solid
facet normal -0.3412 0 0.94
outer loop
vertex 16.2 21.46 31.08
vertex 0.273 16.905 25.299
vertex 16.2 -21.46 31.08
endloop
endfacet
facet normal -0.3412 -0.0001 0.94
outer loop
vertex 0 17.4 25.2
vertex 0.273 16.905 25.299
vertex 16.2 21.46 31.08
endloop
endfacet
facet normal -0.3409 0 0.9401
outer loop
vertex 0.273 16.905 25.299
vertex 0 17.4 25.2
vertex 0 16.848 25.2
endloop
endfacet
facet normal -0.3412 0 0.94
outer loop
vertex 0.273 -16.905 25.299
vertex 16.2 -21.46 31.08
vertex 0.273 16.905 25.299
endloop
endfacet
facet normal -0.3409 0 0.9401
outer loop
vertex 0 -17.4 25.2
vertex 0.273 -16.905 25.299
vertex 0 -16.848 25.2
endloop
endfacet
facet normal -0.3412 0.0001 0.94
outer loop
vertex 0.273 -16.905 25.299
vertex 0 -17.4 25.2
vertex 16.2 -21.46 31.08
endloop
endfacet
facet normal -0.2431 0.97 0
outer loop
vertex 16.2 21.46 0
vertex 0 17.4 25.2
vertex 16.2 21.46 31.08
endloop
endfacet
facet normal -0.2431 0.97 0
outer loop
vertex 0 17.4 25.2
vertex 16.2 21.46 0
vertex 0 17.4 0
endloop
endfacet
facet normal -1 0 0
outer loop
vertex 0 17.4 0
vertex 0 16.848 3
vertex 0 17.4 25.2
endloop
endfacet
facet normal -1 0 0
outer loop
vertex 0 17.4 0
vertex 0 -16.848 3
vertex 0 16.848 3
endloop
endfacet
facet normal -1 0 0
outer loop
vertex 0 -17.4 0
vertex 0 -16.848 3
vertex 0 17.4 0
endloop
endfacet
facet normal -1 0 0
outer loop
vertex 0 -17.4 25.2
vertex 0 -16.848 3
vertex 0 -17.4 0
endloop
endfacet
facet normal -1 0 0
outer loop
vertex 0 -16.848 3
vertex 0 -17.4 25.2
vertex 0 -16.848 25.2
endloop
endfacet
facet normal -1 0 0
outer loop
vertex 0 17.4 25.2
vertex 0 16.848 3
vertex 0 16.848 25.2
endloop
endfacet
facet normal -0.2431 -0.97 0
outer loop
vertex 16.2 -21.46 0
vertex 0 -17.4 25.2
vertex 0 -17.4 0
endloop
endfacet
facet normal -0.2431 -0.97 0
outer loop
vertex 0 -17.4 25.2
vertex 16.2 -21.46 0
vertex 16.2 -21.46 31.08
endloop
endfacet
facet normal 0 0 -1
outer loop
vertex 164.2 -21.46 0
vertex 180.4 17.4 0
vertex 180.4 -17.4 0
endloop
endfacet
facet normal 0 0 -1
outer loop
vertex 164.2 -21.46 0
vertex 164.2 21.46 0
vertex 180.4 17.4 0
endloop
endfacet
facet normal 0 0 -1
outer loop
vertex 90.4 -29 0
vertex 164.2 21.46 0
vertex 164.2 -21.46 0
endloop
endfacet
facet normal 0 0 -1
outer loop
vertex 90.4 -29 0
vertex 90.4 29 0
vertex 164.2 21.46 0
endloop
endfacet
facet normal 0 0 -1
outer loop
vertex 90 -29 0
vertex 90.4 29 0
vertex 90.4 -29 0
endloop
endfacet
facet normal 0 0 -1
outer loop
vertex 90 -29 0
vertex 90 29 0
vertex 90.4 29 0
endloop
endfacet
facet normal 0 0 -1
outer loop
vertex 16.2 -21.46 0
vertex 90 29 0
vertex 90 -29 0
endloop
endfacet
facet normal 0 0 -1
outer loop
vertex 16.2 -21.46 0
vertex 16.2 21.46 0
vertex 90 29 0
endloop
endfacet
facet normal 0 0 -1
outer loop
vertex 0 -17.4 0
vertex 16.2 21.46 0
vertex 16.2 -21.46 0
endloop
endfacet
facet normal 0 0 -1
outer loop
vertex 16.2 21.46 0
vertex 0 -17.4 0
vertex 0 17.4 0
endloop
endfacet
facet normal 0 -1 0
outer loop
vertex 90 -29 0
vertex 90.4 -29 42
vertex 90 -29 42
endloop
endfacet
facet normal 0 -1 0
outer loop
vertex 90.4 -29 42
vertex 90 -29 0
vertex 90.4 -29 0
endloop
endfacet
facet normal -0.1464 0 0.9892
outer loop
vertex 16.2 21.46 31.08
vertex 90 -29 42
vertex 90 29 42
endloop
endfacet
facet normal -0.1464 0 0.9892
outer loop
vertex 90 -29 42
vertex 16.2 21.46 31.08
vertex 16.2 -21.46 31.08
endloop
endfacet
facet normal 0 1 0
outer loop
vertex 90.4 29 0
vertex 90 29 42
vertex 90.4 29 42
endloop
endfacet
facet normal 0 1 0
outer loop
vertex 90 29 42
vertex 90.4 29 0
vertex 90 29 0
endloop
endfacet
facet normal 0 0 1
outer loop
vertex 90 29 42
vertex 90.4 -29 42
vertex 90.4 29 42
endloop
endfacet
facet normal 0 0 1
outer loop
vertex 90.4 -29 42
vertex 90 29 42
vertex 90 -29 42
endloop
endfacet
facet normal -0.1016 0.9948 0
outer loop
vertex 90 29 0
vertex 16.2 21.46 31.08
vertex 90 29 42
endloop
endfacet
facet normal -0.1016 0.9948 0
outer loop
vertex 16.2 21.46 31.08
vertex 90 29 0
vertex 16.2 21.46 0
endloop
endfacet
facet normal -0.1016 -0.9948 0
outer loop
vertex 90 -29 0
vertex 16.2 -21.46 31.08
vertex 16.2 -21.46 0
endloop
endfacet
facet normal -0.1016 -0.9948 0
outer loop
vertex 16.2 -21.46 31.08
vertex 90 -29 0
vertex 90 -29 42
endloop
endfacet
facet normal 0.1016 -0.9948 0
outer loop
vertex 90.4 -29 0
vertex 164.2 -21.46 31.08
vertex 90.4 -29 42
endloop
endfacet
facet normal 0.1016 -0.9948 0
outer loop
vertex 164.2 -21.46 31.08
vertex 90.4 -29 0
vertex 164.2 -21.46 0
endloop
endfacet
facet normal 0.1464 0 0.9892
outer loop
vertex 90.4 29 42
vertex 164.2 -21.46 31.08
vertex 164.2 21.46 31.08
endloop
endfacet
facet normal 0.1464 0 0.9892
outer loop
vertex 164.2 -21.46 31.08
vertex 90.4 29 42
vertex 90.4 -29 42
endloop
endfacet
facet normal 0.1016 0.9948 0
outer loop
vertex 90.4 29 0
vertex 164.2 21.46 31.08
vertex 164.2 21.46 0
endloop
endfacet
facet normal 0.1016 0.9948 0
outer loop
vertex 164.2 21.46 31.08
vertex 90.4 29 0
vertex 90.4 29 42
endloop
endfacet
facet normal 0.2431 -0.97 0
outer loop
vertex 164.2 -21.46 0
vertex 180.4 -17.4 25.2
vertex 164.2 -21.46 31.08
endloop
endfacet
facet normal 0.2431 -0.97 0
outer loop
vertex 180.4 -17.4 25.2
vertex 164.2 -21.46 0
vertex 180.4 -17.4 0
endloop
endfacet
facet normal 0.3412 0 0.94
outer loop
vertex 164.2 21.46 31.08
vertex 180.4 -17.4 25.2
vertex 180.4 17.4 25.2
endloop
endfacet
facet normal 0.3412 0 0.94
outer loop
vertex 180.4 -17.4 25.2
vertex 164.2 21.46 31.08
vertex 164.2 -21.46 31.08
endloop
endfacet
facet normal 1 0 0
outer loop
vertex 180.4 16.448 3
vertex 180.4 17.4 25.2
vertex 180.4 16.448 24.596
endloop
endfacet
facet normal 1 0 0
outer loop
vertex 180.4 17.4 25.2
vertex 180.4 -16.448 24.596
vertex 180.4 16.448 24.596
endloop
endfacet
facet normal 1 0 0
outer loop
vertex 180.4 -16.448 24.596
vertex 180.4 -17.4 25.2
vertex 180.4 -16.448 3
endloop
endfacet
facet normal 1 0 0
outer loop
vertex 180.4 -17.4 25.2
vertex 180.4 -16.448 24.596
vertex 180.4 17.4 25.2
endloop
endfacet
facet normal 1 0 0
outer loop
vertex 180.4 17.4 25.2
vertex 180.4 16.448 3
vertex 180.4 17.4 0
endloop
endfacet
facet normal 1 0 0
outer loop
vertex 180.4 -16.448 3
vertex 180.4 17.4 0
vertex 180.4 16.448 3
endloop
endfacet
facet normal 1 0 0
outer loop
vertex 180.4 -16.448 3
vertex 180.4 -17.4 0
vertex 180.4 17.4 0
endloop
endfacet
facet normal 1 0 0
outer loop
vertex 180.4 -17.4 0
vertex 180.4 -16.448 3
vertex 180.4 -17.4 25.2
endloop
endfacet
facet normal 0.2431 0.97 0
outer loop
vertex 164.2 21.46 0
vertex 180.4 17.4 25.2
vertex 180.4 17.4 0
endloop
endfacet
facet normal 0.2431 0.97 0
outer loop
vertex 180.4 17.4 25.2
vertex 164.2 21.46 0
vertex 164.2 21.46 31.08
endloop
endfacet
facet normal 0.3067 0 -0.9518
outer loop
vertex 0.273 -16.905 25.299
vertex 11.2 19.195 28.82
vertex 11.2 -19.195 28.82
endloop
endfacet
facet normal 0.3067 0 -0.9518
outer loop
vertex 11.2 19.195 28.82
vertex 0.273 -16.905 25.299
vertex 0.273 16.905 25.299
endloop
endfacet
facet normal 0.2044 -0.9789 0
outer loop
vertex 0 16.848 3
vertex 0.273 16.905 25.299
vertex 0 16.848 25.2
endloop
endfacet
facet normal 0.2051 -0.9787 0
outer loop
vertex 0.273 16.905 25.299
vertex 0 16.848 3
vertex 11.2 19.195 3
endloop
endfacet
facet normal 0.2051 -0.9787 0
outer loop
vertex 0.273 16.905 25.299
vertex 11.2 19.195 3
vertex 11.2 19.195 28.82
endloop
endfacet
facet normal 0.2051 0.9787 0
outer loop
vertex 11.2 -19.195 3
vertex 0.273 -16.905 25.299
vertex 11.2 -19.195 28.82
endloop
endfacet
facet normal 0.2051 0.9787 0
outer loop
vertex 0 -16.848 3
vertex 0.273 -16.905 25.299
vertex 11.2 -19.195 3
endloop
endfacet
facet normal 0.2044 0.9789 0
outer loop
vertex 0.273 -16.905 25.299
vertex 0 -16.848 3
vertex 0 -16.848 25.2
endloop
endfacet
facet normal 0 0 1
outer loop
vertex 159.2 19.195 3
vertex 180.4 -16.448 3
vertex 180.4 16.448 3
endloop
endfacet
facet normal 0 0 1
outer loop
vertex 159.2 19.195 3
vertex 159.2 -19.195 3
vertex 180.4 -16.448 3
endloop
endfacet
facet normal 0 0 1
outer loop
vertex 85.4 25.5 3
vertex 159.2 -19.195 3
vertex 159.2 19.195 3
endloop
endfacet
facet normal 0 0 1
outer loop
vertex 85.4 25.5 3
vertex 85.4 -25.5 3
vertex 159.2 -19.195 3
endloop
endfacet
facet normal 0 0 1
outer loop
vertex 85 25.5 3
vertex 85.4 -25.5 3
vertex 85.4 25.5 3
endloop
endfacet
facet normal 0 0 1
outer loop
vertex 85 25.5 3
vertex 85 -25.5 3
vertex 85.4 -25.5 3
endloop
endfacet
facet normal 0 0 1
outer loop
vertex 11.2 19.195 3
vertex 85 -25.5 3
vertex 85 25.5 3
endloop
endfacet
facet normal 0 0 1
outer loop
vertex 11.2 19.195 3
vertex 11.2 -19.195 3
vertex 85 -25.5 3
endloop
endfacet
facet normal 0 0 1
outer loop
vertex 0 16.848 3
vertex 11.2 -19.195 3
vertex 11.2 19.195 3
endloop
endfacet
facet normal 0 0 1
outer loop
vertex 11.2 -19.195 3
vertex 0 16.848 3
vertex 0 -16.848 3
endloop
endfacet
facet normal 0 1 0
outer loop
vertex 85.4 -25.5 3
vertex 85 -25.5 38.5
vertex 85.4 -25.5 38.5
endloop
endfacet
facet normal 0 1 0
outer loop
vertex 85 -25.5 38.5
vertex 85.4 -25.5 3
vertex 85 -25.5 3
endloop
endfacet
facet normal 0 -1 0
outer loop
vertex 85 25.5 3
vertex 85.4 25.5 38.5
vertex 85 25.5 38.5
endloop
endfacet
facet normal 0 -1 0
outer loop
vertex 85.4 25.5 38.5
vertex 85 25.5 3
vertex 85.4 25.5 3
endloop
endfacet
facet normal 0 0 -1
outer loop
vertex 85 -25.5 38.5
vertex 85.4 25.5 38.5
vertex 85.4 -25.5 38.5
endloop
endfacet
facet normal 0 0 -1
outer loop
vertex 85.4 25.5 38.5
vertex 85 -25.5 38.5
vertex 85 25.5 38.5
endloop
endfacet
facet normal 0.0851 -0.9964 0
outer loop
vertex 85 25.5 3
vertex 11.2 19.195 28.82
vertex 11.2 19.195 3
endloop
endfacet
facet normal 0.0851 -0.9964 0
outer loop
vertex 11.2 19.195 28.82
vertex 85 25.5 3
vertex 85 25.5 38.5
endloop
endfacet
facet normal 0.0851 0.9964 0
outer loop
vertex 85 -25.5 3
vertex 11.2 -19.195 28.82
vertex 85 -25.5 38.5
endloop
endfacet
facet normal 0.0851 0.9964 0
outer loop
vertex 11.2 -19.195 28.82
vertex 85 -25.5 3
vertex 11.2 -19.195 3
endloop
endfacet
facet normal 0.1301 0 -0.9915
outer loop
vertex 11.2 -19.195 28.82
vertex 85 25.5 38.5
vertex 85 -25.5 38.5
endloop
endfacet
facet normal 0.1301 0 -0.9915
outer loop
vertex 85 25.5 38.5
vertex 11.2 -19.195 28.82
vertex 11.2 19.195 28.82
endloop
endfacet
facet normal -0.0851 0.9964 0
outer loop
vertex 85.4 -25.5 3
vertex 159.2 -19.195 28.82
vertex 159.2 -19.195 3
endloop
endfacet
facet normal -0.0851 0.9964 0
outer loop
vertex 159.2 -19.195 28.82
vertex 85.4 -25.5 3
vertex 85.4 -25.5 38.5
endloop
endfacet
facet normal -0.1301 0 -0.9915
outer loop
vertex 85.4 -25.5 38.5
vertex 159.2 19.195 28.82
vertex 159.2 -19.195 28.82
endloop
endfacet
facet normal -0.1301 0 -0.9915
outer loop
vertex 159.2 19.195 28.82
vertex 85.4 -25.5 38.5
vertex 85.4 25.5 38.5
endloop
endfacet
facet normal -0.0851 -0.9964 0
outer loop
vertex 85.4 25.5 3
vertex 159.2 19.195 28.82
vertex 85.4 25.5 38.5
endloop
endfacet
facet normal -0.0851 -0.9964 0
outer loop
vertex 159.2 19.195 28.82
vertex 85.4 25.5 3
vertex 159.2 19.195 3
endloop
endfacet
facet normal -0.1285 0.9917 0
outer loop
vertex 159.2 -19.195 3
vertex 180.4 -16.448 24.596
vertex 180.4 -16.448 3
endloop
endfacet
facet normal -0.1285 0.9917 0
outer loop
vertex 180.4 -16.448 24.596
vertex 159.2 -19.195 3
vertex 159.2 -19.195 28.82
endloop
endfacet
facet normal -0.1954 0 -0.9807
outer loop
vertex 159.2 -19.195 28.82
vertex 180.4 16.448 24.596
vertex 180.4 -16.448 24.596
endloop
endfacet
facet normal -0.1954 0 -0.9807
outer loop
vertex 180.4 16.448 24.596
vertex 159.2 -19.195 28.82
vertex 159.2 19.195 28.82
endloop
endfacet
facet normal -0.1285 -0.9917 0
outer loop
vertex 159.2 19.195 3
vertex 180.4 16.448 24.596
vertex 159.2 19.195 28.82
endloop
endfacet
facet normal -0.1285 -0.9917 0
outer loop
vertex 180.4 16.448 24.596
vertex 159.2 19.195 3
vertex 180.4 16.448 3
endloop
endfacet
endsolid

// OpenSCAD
$fn = 32;

// ----------------------------------------------------------------------
// Faired channel: 180 x 58 x 42 mm, 3.5 mm walls, faired ends
// ----------------------------------------------------------------------

// --- parameters (mm) ---
length = 180;             // channel length
width = 58;               // channel width at mid length
height = 42;              // channel height at mid length
wall = 3.5;               // side wall thickness
floor_t = 3;              // floor thickness
end_w = 34.8;             // faired end width
end_h = 25.2;             // faired end height

difference() {
  union() {
    hull() {
      translate([0, -17.4, 0]) cube([0.4, 34.8, 25.2]);
      translate([16.2, -21.46, 0]) cube([0.4, 42.92, 31.08]);
    }
    hull() {
      translate([16.2, -21.46, 0]) cube([0.4, 42.92, 31.08]);
      translate([90, -29, 0]) cube([0.4, 58, 42]);
    }
    hull() {
      translate([90, -29, 0]) cube([0.4, 58, 42]);
      translate([163.8, -21.46, 0]) cube([0.4, 42.92, 31.08]);
    }
    hull() {
      translate([163.8, -21.46, 0]) cube([0.4, 42.92, 31.08]);
      translate([180, -17.4, 0]) cube([0.4, 34.8, 25.2]);
    }
  }
  /* cavity, 5 mm proud of both ends so the ports are cut clean */
  hull() {
    translate([-5, -15.8, 3]) cube([0.4, 31.6, 20.6]);
    translate([11.2, -19.195, 3]) cube([0.4, 38.39, 25.82]);
  }
  hull() {
    translate([11.2, -19.195, 3]) cube([0.4, 38.39, 25.82]);
    translate([85, -25.5, 3]) cube([0.4, 51, 35.5]);
  }
  hull() {
    translate([85, -25.5, 3]) cube([0.4, 51, 35.5]);
    translate([158.8, -19.195, 3]) cube([0.4, 38.39, 25.82]);
  }
  hull() {
    translate([158.8, -19.195, 3]) cube([0.4, 38.39, 25.82]);
    translate([185, -15.8, 3]) cube([0.4, 31.6, 20.6]);
  }
}
